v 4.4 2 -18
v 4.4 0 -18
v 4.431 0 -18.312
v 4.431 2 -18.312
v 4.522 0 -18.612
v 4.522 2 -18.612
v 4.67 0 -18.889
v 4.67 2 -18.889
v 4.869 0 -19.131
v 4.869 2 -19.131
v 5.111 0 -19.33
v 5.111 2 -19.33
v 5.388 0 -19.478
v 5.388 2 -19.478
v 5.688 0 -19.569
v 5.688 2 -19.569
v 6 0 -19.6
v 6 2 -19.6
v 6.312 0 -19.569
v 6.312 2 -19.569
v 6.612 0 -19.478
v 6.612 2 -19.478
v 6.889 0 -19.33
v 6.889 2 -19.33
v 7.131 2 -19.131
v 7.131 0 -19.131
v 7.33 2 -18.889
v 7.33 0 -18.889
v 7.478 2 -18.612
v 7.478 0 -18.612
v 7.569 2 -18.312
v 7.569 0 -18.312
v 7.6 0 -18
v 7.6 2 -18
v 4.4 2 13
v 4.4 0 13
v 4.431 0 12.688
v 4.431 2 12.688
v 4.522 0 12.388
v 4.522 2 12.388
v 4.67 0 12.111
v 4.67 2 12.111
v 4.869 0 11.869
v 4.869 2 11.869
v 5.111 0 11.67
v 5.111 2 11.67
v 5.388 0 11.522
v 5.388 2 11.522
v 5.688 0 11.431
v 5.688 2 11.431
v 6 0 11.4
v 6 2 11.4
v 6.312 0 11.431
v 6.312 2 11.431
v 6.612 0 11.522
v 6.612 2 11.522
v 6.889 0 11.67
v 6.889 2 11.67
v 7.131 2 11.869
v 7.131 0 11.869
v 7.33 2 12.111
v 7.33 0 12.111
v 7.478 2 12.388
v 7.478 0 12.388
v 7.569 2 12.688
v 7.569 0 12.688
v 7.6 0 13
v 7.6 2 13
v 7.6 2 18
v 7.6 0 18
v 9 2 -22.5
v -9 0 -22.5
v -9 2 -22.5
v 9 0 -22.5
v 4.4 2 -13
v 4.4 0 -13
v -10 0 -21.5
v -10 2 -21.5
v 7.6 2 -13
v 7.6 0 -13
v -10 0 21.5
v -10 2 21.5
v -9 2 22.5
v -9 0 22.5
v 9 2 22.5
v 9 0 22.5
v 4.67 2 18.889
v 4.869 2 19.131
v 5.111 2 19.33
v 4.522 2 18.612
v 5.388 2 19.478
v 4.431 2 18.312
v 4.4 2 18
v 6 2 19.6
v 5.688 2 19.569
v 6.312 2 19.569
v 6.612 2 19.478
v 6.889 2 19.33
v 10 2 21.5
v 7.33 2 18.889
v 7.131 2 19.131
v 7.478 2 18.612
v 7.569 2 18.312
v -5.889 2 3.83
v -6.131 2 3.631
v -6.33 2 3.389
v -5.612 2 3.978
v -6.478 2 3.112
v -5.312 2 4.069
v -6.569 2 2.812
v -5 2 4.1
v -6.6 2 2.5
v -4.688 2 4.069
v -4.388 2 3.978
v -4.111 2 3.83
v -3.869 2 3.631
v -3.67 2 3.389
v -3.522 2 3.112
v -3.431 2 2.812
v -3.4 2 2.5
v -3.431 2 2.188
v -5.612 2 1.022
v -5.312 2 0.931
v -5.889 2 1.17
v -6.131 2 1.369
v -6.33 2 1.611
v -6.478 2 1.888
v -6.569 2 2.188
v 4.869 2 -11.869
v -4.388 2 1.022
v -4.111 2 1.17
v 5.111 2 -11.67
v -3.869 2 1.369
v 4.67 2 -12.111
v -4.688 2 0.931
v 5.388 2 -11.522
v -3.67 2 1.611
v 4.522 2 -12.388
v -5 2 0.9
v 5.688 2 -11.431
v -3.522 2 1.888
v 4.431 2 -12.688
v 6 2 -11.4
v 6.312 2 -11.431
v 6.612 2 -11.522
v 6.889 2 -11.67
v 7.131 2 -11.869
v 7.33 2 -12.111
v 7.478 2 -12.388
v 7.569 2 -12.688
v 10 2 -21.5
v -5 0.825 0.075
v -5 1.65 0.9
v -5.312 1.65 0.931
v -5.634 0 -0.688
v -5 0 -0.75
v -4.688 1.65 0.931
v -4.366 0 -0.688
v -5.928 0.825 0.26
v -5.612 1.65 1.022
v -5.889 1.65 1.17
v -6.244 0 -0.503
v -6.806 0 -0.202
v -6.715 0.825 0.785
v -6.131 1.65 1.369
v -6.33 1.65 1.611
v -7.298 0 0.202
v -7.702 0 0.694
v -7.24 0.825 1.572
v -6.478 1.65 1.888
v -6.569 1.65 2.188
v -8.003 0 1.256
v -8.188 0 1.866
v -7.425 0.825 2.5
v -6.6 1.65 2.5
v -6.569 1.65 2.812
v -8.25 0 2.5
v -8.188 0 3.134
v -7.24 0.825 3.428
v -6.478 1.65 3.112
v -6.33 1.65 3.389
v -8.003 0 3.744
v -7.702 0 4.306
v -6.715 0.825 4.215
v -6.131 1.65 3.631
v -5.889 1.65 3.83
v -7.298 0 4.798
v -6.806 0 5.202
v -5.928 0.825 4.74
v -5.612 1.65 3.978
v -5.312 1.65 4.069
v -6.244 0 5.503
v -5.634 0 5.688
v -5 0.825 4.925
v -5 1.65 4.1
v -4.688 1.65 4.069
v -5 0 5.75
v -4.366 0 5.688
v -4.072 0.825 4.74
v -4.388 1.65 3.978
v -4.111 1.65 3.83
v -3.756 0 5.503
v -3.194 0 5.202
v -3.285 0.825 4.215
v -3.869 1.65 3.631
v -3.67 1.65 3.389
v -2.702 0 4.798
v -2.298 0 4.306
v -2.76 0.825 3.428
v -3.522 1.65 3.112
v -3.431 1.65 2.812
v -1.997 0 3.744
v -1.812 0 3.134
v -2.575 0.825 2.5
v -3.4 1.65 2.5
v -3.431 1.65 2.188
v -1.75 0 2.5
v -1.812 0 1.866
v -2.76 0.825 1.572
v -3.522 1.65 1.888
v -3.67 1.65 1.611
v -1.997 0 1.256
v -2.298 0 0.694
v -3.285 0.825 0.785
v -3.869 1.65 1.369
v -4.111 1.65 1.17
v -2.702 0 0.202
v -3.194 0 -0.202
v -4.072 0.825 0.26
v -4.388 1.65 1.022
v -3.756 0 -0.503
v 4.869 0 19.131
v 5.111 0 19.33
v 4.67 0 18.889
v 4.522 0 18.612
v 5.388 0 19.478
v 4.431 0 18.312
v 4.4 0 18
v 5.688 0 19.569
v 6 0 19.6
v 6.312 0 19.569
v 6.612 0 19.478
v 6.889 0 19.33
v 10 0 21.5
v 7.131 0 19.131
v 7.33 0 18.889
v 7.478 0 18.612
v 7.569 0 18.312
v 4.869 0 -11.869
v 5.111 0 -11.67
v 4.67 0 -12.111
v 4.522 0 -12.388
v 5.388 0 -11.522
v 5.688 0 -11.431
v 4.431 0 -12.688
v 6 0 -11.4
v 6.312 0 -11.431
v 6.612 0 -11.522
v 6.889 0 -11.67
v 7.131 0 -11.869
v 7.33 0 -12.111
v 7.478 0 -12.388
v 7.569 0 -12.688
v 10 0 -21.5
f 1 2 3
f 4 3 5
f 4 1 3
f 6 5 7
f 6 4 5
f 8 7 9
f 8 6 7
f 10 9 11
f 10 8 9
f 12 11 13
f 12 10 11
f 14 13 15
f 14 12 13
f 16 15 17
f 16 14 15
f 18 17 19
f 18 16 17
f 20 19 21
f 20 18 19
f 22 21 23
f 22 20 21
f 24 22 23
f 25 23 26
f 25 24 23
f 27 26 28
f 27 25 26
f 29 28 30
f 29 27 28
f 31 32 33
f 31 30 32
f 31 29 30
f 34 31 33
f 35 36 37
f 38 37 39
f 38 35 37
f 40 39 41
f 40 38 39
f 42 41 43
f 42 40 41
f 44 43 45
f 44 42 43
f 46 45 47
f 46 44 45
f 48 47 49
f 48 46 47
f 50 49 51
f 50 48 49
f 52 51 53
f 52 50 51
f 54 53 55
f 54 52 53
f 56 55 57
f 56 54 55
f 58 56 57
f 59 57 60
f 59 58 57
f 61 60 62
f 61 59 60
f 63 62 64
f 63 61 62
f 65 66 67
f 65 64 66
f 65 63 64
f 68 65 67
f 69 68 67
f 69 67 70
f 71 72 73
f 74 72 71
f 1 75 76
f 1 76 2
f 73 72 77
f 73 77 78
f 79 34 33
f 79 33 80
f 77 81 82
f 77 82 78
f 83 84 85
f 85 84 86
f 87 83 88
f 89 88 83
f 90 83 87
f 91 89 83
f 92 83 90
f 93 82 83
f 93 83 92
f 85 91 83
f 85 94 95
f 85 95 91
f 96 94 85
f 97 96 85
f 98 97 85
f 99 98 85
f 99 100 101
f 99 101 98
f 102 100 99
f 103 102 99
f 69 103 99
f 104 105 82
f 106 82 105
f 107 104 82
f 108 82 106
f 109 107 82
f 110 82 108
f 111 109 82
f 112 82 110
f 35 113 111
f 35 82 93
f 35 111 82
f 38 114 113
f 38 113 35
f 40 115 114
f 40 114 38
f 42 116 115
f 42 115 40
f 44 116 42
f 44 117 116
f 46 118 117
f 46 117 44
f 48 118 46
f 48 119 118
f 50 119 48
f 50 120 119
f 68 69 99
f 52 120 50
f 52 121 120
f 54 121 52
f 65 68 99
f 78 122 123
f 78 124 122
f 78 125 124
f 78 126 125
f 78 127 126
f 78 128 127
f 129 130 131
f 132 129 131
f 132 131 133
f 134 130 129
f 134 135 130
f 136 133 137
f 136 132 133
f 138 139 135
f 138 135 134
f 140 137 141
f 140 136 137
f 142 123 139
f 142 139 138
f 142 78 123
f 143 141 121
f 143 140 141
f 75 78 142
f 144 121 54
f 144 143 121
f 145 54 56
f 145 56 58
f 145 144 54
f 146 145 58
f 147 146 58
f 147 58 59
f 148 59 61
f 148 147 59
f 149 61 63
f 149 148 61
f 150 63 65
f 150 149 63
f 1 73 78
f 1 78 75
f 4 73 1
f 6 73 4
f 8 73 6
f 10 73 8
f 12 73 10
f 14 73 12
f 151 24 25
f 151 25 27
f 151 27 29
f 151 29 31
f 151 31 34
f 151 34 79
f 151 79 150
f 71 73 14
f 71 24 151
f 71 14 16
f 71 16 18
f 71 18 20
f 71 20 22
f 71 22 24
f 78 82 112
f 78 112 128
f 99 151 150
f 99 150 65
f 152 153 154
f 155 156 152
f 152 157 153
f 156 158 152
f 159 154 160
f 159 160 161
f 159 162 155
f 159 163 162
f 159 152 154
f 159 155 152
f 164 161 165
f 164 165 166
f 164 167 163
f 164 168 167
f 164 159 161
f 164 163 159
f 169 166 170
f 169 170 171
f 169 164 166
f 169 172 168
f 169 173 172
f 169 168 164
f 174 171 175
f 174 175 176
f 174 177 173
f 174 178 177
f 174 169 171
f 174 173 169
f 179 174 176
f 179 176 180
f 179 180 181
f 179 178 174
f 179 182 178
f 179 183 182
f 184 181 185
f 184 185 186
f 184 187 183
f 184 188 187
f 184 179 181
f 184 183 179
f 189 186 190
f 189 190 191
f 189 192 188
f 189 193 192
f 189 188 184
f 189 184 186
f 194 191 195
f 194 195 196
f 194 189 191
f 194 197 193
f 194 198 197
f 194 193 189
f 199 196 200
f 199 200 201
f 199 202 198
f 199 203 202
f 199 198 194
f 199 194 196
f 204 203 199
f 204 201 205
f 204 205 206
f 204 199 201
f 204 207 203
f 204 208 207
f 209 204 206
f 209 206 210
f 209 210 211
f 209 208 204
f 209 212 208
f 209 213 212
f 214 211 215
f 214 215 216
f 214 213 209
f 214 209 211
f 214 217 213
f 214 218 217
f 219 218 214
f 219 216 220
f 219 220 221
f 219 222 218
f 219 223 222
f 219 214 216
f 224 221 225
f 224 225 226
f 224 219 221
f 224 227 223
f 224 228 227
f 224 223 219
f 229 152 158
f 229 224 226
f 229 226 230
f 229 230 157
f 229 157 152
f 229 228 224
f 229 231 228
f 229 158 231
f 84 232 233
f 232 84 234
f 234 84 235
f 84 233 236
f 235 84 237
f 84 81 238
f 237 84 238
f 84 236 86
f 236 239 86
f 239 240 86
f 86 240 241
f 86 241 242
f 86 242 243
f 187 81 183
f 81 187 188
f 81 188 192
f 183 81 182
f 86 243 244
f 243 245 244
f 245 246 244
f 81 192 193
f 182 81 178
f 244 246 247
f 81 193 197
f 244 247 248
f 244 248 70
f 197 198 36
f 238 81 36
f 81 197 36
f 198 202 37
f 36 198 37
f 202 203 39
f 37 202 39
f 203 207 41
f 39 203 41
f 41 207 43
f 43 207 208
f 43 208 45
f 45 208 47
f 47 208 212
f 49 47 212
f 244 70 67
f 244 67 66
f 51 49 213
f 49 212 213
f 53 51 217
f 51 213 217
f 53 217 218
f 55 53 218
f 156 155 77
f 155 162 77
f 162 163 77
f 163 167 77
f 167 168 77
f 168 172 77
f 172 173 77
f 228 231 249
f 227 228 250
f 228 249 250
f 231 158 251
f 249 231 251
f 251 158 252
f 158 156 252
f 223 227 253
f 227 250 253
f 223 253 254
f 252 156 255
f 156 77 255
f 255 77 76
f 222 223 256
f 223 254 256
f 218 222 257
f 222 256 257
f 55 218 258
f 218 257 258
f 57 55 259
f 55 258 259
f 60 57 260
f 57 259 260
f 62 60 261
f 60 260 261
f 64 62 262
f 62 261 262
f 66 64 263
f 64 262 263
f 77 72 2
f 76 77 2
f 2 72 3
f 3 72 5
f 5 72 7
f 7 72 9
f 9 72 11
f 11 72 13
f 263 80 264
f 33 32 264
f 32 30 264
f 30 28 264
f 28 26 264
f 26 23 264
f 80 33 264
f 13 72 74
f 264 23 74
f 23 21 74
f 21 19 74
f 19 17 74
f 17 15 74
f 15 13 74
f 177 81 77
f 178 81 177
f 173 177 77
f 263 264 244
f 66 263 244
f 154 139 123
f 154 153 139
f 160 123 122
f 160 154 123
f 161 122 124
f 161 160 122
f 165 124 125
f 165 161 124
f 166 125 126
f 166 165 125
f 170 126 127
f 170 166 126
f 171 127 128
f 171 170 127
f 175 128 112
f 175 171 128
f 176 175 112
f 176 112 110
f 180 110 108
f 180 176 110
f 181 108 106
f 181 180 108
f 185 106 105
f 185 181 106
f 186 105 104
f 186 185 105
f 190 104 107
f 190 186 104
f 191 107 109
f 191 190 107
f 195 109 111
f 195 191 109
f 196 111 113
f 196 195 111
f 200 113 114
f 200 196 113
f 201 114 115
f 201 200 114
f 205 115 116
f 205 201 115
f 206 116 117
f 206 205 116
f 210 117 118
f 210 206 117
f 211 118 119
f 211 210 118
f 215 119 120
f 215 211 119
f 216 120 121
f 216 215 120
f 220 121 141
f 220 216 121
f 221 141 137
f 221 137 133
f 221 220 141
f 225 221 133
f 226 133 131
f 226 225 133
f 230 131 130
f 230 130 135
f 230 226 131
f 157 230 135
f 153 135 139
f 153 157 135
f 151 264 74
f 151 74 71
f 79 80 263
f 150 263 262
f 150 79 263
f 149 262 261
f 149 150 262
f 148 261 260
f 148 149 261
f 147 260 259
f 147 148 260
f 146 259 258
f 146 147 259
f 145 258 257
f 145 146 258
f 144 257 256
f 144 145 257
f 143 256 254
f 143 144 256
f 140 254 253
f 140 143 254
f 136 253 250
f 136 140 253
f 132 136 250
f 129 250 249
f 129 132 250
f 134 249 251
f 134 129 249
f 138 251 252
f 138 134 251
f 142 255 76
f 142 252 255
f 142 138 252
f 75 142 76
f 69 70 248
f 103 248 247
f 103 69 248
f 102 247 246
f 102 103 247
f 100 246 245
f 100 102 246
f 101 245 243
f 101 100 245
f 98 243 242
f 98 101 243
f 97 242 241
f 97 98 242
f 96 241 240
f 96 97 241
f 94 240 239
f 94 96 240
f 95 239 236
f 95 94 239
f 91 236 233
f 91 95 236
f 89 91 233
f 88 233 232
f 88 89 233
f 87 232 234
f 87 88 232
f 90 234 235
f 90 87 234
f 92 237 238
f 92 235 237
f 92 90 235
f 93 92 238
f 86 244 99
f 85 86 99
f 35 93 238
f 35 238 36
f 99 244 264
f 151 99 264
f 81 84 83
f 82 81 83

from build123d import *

# Parameters (mm, degrees)
SKETCH1_W        = 20
SKETCH1_H        = 45
BASESHEET_DEPTH  = 2
SCREWSLOTS_DEPTH = 3
CHAMFER1X45_SIZE = 1


with BuildPart() as part:
    # Sketch1 → BaseSheet (new body)
    with BuildSketch(Plane(origin=(0, 0, 0), x_dir=(1, 0, 0), z_dir=(0, 1, 0))):
        Rectangle(SKETCH1_W, SKETCH1_H)
    extrude(amount=BASESHEET_DEPTH)

    # Sketch6 → ScrewSlots (cut, through all)
    with BuildSketch(Plane(origin=(0, 2, 0), x_dir=(1, 0, 0), z_dir=(0, 1, 0))):
        with BuildLine():
            Line((7.6, 18), (7.6, 13))
            ThreePointArc((7.6, 13), (6, 11.4), (4.4, 13))
            Line((4.4, 13), (4.4, 18))
            ThreePointArc((4.4, 18), (6, 19.6), (7.6, 18))
        make_face()
        with BuildLine():
            Line((7.6, -13), (7.6, -18))
            ThreePointArc((7.6, -18), (6, -19.6), (4.4, -18))
            Line((4.4, -18), (4.4, -13))
            ThreePointArc((4.4, -13), (6, -11.4), (7.6, -13))
        make_face()
    extrude(amount=-SCREWSLOTS_DEPTH, mode=Mode.SUBTRACT)

    # Sketch5 → PulleyHole (revolve, cut)
    with BuildSketch(Plane(origin=(-5, 0, 2.5), x_dir=(0, 0, -1), z_dir=(1, 0, 0))):
        Polygon((0, 0), (0, 2), (1.6, 2), (1.6, 1.65), (3.25, 0), align=None)
    revolve(axis=Axis((-5, -6.35, 2.5), (0, 1, 0)), mode=Mode.SUBTRACT)

    # Chamfer1x45
    chamfer1x45_edges = [part.edges().sort_by_distance(p)[0] for p in [
        (-10, 1, -22.5),
        (10, 1, -22.5),
        (10, 1, 22.5),
        (-10, 1, 22.5),
    ]]
    chamfer(chamfer1x45_edges, length=CHAMFER1X45_SIZE)


solid = part.part
